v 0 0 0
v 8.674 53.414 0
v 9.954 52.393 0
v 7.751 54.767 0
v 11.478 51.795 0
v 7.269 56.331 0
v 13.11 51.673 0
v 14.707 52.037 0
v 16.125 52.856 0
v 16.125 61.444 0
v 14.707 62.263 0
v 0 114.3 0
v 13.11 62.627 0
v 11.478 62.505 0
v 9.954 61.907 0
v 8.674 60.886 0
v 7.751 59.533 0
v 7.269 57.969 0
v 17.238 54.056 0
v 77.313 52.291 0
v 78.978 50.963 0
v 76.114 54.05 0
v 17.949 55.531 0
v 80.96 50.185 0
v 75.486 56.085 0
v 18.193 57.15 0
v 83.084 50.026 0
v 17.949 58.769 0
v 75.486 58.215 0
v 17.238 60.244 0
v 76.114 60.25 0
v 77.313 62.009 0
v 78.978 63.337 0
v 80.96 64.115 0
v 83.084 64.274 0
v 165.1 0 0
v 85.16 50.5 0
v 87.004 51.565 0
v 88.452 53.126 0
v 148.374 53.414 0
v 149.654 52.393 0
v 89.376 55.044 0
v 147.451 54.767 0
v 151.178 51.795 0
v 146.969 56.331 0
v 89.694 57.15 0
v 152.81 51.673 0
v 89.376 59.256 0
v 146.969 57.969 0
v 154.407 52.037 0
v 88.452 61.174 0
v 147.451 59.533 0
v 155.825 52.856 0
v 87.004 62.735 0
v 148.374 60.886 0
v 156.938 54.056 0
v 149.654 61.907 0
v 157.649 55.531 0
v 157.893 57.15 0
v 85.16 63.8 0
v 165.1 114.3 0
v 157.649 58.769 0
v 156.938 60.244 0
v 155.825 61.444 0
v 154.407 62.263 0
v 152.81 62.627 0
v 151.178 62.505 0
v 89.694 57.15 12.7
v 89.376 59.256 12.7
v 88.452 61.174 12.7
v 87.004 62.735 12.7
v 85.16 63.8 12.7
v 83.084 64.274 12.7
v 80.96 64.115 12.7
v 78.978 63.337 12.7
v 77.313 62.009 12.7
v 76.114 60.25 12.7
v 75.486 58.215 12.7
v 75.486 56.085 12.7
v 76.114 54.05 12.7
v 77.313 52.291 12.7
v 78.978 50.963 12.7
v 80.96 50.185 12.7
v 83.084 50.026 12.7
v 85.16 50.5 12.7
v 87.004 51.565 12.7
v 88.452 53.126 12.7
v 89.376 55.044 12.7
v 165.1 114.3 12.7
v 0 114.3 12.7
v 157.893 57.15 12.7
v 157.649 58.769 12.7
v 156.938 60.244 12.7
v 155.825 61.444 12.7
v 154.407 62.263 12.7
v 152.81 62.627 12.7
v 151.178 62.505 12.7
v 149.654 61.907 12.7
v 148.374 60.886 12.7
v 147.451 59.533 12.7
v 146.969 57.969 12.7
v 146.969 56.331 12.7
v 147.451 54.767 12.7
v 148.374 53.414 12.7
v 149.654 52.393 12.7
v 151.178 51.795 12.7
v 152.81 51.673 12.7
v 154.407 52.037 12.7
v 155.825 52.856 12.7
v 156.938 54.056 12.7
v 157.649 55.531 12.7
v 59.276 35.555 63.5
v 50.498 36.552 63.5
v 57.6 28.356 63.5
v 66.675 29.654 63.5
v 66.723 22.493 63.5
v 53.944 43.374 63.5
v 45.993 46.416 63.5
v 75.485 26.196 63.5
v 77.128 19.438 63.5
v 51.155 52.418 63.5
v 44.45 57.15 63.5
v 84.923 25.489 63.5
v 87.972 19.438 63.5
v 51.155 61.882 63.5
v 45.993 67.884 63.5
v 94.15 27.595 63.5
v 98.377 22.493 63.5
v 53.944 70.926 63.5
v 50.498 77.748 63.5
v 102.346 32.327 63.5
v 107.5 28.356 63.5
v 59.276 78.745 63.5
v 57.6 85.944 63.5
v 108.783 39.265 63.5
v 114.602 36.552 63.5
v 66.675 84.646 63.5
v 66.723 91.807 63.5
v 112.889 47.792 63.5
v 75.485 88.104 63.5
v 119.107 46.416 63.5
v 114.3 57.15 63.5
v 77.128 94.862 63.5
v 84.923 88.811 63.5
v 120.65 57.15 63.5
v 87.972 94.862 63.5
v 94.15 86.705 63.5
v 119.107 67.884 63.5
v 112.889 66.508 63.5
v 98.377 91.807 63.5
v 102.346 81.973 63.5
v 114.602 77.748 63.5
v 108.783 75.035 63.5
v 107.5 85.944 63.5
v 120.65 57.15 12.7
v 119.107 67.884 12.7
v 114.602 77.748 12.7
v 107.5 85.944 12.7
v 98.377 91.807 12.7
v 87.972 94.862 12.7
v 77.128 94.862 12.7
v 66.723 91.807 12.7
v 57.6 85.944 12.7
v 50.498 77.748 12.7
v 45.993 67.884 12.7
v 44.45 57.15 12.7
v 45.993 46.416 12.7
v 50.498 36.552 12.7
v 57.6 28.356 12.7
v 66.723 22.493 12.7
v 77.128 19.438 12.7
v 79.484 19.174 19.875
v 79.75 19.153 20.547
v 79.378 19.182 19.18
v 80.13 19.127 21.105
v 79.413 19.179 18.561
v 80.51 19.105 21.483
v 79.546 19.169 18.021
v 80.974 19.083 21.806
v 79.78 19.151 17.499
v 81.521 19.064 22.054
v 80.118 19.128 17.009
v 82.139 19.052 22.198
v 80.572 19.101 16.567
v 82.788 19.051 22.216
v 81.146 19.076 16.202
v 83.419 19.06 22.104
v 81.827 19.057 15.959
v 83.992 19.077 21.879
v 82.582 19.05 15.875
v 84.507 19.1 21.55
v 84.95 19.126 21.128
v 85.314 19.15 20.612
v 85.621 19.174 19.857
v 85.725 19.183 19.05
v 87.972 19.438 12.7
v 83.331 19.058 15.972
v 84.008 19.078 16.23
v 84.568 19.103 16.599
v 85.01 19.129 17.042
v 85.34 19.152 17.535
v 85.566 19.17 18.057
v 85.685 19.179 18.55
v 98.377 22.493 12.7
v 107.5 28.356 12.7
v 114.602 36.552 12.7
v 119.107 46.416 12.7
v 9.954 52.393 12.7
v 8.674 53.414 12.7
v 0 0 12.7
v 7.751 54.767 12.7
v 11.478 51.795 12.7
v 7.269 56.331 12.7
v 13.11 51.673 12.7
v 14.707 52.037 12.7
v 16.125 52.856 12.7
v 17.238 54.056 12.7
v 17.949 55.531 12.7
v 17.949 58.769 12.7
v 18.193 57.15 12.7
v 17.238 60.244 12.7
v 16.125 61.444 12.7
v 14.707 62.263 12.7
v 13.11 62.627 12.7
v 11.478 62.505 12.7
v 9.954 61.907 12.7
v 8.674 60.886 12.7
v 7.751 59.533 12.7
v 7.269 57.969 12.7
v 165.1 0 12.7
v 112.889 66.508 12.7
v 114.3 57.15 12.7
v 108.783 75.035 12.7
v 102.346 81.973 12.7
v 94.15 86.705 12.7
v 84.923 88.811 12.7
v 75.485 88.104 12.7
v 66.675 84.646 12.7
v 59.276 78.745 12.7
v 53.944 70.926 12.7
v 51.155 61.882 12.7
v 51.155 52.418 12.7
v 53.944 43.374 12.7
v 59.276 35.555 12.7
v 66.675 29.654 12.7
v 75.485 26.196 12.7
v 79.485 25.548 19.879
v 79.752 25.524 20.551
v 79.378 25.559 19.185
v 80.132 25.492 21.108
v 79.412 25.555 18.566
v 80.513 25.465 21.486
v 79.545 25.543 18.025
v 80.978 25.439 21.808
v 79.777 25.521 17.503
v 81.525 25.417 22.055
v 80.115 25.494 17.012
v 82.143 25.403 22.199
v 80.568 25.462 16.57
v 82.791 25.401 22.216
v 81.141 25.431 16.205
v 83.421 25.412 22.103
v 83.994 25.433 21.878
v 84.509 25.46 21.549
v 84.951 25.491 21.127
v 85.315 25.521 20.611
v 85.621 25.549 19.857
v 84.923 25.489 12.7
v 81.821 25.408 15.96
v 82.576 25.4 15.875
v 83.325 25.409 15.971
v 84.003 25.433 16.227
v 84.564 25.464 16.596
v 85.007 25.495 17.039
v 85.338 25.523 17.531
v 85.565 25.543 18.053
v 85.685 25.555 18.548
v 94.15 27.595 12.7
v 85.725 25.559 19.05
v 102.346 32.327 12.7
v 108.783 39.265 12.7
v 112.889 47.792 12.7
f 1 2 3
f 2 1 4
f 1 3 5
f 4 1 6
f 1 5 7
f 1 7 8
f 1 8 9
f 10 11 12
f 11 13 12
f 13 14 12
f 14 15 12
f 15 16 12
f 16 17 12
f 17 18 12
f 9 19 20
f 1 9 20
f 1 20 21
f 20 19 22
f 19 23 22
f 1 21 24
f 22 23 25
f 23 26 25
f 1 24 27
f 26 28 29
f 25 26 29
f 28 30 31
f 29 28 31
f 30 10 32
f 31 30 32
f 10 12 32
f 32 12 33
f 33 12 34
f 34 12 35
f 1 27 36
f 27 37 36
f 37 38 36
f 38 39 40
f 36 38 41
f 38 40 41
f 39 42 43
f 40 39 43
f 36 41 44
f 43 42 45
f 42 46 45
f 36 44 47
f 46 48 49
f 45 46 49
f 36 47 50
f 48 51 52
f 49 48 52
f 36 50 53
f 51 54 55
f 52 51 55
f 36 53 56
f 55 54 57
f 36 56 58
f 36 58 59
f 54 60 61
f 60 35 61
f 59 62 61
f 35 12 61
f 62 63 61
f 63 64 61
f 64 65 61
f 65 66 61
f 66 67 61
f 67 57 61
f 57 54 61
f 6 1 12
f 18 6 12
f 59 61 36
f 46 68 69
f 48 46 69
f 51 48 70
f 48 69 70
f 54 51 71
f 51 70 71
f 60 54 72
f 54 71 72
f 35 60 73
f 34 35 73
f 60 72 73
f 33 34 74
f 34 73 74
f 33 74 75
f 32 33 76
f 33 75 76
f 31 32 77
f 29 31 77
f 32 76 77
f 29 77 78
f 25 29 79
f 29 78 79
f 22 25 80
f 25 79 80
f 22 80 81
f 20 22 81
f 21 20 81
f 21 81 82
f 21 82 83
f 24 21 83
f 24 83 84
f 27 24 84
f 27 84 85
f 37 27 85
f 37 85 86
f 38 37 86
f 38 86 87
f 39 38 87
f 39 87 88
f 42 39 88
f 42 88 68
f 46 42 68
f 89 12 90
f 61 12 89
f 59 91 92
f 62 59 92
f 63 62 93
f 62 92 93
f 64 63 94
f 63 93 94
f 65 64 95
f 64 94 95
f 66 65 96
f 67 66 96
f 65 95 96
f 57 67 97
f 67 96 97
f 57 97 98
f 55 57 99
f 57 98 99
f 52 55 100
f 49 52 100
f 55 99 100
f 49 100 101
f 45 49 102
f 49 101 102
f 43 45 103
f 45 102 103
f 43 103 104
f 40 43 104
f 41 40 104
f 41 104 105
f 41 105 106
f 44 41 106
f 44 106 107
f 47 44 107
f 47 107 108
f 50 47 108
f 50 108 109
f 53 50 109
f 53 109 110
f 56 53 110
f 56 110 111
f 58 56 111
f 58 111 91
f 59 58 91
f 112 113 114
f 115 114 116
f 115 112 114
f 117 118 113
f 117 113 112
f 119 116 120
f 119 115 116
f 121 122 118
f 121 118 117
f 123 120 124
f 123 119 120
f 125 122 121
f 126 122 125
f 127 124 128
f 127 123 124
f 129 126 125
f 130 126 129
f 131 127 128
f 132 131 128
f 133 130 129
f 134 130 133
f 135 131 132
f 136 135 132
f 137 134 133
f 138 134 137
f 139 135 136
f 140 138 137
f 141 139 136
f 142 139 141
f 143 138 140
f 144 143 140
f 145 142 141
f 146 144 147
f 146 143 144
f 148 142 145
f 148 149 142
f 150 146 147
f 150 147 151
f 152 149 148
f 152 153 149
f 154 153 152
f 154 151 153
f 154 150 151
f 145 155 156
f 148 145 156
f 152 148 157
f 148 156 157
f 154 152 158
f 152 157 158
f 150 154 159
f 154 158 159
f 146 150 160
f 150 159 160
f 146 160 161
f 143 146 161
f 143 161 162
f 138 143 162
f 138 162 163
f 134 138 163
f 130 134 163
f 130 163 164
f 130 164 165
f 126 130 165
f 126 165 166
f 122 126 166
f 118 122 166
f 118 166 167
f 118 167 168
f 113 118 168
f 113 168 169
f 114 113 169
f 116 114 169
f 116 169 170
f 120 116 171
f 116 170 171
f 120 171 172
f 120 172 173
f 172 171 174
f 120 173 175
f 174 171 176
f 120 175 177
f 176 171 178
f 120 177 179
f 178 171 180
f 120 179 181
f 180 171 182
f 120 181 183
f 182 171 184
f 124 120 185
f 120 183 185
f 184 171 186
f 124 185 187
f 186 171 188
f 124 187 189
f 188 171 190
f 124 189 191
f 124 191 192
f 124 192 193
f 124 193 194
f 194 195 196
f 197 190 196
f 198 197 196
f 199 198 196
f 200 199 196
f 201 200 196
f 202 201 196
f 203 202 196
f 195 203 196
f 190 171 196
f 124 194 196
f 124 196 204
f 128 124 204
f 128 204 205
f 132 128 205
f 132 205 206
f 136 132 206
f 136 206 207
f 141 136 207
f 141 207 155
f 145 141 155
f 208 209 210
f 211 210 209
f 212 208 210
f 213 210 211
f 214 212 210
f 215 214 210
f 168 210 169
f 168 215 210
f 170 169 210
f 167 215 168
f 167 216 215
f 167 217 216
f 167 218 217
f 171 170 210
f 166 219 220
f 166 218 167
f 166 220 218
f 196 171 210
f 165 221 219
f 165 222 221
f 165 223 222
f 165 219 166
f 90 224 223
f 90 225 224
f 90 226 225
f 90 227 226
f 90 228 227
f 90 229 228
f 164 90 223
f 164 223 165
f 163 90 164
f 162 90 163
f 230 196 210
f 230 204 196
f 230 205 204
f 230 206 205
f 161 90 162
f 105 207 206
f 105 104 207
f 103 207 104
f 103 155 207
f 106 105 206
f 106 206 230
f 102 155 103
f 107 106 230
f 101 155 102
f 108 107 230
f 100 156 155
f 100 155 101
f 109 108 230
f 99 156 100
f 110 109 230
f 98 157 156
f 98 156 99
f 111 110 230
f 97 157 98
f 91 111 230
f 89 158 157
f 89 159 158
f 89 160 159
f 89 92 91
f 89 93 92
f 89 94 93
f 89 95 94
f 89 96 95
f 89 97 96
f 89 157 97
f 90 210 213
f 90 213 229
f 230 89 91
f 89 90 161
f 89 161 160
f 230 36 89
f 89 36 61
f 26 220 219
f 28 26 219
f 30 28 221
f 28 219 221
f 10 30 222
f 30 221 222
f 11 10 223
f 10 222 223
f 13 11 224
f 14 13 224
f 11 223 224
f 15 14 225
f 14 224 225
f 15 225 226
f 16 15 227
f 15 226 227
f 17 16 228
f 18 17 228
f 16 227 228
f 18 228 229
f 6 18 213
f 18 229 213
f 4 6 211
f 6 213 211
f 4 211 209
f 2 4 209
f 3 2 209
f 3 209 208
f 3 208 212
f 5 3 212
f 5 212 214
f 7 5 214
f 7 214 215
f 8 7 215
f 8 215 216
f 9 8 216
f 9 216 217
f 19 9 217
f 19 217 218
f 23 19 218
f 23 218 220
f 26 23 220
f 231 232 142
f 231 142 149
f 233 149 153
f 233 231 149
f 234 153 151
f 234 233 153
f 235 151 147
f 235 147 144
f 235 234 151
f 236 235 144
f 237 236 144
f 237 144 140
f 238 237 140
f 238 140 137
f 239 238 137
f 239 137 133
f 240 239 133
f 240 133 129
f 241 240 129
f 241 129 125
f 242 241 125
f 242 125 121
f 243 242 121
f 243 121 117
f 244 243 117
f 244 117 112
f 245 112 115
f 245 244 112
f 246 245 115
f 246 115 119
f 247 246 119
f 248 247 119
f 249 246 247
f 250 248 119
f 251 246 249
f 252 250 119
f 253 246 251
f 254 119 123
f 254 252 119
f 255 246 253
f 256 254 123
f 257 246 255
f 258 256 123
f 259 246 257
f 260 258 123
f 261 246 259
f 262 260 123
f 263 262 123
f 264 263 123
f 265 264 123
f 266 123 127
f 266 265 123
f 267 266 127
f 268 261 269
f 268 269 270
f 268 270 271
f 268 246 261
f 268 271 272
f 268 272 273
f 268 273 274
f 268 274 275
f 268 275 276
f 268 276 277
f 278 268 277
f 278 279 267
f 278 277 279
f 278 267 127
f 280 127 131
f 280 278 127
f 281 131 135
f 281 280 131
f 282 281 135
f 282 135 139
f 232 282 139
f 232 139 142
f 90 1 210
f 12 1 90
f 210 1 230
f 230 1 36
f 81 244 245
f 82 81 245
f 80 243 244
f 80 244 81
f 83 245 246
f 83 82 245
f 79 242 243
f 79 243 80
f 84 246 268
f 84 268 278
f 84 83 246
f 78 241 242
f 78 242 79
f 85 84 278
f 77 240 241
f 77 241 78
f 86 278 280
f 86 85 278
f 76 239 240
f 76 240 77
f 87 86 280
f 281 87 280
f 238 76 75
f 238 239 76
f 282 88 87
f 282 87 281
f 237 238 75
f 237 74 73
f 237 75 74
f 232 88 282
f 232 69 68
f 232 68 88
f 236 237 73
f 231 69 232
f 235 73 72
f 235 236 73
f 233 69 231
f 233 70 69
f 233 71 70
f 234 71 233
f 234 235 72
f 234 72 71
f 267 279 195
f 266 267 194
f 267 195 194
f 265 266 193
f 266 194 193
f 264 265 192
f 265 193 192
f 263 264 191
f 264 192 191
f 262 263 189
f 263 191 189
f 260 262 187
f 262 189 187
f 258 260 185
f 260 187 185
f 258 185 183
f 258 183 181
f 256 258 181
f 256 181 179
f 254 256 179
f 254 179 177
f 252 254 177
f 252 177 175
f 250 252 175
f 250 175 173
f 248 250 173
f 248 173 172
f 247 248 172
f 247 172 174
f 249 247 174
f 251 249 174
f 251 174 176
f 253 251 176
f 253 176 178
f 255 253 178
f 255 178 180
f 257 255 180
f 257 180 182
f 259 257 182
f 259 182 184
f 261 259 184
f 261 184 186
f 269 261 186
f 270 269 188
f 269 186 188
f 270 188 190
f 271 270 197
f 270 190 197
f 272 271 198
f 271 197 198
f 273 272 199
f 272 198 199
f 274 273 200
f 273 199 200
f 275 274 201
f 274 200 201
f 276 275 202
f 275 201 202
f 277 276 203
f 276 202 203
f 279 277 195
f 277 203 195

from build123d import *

# Parameters (mm, degrees)
F0_W     = 165.1
F0_H     = 114.3
F1_DEPTH = 12.7
F2_R     = 38.1
F2_R_2   = 31.75
F3_DEPTH = 50.8
F4_R     = 5.49275
F4_R_2   = 7.14375
F5_DEPTH = 25.4
F7_DEPTH = 76.2


with BuildPart() as f1:
    # F0 (on Top) → F1 (new body)
    with BuildSketch(Plane.XY):
        with Locations((82.55, 57.15)):
            Rectangle(F0_W, F0_H)
    extrude(amount=F1_DEPTH)

    # F2 (on face) → F3 (join)
    with BuildSketch(Plane.XY.offset(12.7)):
        with Locations((82.55, 57.15)):
            Circle(F2_R)
        with Locations((82.55, 57.15)):
            Circle(F2_R_2, mode=Mode.SUBTRACT)
    extrude(amount=F3_DEPTH)

    # F4 (on face) → F5 (cut)
    with BuildSketch(Plane.XY.offset(12.7)):
        with Locations((152.4, 57.15)):
            Circle(F4_R)
        with Locations((12.7, 57.15)):
            Circle(F4_R)
        with Locations((82.55, 57.15)):
            Circle(F4_R_2)
    extrude(amount=-F5_DEPTH, mode=Mode.SUBTRACT)

    # F6 (on Front) → F7 (cut)
    with BuildSketch(Plane.XZ):
        with BuildLine():
            ThreePointArc((79.375, 19.05), (82.55, 15.875), (85.725, 19.05))
            ThreePointArc((85.725, 19.05), (82.55, 22.225), (79.375, 19.05))
        make_face()
    extrude(amount=-F7_DEPTH, mode=Mode.SUBTRACT)


solid = f1.part
